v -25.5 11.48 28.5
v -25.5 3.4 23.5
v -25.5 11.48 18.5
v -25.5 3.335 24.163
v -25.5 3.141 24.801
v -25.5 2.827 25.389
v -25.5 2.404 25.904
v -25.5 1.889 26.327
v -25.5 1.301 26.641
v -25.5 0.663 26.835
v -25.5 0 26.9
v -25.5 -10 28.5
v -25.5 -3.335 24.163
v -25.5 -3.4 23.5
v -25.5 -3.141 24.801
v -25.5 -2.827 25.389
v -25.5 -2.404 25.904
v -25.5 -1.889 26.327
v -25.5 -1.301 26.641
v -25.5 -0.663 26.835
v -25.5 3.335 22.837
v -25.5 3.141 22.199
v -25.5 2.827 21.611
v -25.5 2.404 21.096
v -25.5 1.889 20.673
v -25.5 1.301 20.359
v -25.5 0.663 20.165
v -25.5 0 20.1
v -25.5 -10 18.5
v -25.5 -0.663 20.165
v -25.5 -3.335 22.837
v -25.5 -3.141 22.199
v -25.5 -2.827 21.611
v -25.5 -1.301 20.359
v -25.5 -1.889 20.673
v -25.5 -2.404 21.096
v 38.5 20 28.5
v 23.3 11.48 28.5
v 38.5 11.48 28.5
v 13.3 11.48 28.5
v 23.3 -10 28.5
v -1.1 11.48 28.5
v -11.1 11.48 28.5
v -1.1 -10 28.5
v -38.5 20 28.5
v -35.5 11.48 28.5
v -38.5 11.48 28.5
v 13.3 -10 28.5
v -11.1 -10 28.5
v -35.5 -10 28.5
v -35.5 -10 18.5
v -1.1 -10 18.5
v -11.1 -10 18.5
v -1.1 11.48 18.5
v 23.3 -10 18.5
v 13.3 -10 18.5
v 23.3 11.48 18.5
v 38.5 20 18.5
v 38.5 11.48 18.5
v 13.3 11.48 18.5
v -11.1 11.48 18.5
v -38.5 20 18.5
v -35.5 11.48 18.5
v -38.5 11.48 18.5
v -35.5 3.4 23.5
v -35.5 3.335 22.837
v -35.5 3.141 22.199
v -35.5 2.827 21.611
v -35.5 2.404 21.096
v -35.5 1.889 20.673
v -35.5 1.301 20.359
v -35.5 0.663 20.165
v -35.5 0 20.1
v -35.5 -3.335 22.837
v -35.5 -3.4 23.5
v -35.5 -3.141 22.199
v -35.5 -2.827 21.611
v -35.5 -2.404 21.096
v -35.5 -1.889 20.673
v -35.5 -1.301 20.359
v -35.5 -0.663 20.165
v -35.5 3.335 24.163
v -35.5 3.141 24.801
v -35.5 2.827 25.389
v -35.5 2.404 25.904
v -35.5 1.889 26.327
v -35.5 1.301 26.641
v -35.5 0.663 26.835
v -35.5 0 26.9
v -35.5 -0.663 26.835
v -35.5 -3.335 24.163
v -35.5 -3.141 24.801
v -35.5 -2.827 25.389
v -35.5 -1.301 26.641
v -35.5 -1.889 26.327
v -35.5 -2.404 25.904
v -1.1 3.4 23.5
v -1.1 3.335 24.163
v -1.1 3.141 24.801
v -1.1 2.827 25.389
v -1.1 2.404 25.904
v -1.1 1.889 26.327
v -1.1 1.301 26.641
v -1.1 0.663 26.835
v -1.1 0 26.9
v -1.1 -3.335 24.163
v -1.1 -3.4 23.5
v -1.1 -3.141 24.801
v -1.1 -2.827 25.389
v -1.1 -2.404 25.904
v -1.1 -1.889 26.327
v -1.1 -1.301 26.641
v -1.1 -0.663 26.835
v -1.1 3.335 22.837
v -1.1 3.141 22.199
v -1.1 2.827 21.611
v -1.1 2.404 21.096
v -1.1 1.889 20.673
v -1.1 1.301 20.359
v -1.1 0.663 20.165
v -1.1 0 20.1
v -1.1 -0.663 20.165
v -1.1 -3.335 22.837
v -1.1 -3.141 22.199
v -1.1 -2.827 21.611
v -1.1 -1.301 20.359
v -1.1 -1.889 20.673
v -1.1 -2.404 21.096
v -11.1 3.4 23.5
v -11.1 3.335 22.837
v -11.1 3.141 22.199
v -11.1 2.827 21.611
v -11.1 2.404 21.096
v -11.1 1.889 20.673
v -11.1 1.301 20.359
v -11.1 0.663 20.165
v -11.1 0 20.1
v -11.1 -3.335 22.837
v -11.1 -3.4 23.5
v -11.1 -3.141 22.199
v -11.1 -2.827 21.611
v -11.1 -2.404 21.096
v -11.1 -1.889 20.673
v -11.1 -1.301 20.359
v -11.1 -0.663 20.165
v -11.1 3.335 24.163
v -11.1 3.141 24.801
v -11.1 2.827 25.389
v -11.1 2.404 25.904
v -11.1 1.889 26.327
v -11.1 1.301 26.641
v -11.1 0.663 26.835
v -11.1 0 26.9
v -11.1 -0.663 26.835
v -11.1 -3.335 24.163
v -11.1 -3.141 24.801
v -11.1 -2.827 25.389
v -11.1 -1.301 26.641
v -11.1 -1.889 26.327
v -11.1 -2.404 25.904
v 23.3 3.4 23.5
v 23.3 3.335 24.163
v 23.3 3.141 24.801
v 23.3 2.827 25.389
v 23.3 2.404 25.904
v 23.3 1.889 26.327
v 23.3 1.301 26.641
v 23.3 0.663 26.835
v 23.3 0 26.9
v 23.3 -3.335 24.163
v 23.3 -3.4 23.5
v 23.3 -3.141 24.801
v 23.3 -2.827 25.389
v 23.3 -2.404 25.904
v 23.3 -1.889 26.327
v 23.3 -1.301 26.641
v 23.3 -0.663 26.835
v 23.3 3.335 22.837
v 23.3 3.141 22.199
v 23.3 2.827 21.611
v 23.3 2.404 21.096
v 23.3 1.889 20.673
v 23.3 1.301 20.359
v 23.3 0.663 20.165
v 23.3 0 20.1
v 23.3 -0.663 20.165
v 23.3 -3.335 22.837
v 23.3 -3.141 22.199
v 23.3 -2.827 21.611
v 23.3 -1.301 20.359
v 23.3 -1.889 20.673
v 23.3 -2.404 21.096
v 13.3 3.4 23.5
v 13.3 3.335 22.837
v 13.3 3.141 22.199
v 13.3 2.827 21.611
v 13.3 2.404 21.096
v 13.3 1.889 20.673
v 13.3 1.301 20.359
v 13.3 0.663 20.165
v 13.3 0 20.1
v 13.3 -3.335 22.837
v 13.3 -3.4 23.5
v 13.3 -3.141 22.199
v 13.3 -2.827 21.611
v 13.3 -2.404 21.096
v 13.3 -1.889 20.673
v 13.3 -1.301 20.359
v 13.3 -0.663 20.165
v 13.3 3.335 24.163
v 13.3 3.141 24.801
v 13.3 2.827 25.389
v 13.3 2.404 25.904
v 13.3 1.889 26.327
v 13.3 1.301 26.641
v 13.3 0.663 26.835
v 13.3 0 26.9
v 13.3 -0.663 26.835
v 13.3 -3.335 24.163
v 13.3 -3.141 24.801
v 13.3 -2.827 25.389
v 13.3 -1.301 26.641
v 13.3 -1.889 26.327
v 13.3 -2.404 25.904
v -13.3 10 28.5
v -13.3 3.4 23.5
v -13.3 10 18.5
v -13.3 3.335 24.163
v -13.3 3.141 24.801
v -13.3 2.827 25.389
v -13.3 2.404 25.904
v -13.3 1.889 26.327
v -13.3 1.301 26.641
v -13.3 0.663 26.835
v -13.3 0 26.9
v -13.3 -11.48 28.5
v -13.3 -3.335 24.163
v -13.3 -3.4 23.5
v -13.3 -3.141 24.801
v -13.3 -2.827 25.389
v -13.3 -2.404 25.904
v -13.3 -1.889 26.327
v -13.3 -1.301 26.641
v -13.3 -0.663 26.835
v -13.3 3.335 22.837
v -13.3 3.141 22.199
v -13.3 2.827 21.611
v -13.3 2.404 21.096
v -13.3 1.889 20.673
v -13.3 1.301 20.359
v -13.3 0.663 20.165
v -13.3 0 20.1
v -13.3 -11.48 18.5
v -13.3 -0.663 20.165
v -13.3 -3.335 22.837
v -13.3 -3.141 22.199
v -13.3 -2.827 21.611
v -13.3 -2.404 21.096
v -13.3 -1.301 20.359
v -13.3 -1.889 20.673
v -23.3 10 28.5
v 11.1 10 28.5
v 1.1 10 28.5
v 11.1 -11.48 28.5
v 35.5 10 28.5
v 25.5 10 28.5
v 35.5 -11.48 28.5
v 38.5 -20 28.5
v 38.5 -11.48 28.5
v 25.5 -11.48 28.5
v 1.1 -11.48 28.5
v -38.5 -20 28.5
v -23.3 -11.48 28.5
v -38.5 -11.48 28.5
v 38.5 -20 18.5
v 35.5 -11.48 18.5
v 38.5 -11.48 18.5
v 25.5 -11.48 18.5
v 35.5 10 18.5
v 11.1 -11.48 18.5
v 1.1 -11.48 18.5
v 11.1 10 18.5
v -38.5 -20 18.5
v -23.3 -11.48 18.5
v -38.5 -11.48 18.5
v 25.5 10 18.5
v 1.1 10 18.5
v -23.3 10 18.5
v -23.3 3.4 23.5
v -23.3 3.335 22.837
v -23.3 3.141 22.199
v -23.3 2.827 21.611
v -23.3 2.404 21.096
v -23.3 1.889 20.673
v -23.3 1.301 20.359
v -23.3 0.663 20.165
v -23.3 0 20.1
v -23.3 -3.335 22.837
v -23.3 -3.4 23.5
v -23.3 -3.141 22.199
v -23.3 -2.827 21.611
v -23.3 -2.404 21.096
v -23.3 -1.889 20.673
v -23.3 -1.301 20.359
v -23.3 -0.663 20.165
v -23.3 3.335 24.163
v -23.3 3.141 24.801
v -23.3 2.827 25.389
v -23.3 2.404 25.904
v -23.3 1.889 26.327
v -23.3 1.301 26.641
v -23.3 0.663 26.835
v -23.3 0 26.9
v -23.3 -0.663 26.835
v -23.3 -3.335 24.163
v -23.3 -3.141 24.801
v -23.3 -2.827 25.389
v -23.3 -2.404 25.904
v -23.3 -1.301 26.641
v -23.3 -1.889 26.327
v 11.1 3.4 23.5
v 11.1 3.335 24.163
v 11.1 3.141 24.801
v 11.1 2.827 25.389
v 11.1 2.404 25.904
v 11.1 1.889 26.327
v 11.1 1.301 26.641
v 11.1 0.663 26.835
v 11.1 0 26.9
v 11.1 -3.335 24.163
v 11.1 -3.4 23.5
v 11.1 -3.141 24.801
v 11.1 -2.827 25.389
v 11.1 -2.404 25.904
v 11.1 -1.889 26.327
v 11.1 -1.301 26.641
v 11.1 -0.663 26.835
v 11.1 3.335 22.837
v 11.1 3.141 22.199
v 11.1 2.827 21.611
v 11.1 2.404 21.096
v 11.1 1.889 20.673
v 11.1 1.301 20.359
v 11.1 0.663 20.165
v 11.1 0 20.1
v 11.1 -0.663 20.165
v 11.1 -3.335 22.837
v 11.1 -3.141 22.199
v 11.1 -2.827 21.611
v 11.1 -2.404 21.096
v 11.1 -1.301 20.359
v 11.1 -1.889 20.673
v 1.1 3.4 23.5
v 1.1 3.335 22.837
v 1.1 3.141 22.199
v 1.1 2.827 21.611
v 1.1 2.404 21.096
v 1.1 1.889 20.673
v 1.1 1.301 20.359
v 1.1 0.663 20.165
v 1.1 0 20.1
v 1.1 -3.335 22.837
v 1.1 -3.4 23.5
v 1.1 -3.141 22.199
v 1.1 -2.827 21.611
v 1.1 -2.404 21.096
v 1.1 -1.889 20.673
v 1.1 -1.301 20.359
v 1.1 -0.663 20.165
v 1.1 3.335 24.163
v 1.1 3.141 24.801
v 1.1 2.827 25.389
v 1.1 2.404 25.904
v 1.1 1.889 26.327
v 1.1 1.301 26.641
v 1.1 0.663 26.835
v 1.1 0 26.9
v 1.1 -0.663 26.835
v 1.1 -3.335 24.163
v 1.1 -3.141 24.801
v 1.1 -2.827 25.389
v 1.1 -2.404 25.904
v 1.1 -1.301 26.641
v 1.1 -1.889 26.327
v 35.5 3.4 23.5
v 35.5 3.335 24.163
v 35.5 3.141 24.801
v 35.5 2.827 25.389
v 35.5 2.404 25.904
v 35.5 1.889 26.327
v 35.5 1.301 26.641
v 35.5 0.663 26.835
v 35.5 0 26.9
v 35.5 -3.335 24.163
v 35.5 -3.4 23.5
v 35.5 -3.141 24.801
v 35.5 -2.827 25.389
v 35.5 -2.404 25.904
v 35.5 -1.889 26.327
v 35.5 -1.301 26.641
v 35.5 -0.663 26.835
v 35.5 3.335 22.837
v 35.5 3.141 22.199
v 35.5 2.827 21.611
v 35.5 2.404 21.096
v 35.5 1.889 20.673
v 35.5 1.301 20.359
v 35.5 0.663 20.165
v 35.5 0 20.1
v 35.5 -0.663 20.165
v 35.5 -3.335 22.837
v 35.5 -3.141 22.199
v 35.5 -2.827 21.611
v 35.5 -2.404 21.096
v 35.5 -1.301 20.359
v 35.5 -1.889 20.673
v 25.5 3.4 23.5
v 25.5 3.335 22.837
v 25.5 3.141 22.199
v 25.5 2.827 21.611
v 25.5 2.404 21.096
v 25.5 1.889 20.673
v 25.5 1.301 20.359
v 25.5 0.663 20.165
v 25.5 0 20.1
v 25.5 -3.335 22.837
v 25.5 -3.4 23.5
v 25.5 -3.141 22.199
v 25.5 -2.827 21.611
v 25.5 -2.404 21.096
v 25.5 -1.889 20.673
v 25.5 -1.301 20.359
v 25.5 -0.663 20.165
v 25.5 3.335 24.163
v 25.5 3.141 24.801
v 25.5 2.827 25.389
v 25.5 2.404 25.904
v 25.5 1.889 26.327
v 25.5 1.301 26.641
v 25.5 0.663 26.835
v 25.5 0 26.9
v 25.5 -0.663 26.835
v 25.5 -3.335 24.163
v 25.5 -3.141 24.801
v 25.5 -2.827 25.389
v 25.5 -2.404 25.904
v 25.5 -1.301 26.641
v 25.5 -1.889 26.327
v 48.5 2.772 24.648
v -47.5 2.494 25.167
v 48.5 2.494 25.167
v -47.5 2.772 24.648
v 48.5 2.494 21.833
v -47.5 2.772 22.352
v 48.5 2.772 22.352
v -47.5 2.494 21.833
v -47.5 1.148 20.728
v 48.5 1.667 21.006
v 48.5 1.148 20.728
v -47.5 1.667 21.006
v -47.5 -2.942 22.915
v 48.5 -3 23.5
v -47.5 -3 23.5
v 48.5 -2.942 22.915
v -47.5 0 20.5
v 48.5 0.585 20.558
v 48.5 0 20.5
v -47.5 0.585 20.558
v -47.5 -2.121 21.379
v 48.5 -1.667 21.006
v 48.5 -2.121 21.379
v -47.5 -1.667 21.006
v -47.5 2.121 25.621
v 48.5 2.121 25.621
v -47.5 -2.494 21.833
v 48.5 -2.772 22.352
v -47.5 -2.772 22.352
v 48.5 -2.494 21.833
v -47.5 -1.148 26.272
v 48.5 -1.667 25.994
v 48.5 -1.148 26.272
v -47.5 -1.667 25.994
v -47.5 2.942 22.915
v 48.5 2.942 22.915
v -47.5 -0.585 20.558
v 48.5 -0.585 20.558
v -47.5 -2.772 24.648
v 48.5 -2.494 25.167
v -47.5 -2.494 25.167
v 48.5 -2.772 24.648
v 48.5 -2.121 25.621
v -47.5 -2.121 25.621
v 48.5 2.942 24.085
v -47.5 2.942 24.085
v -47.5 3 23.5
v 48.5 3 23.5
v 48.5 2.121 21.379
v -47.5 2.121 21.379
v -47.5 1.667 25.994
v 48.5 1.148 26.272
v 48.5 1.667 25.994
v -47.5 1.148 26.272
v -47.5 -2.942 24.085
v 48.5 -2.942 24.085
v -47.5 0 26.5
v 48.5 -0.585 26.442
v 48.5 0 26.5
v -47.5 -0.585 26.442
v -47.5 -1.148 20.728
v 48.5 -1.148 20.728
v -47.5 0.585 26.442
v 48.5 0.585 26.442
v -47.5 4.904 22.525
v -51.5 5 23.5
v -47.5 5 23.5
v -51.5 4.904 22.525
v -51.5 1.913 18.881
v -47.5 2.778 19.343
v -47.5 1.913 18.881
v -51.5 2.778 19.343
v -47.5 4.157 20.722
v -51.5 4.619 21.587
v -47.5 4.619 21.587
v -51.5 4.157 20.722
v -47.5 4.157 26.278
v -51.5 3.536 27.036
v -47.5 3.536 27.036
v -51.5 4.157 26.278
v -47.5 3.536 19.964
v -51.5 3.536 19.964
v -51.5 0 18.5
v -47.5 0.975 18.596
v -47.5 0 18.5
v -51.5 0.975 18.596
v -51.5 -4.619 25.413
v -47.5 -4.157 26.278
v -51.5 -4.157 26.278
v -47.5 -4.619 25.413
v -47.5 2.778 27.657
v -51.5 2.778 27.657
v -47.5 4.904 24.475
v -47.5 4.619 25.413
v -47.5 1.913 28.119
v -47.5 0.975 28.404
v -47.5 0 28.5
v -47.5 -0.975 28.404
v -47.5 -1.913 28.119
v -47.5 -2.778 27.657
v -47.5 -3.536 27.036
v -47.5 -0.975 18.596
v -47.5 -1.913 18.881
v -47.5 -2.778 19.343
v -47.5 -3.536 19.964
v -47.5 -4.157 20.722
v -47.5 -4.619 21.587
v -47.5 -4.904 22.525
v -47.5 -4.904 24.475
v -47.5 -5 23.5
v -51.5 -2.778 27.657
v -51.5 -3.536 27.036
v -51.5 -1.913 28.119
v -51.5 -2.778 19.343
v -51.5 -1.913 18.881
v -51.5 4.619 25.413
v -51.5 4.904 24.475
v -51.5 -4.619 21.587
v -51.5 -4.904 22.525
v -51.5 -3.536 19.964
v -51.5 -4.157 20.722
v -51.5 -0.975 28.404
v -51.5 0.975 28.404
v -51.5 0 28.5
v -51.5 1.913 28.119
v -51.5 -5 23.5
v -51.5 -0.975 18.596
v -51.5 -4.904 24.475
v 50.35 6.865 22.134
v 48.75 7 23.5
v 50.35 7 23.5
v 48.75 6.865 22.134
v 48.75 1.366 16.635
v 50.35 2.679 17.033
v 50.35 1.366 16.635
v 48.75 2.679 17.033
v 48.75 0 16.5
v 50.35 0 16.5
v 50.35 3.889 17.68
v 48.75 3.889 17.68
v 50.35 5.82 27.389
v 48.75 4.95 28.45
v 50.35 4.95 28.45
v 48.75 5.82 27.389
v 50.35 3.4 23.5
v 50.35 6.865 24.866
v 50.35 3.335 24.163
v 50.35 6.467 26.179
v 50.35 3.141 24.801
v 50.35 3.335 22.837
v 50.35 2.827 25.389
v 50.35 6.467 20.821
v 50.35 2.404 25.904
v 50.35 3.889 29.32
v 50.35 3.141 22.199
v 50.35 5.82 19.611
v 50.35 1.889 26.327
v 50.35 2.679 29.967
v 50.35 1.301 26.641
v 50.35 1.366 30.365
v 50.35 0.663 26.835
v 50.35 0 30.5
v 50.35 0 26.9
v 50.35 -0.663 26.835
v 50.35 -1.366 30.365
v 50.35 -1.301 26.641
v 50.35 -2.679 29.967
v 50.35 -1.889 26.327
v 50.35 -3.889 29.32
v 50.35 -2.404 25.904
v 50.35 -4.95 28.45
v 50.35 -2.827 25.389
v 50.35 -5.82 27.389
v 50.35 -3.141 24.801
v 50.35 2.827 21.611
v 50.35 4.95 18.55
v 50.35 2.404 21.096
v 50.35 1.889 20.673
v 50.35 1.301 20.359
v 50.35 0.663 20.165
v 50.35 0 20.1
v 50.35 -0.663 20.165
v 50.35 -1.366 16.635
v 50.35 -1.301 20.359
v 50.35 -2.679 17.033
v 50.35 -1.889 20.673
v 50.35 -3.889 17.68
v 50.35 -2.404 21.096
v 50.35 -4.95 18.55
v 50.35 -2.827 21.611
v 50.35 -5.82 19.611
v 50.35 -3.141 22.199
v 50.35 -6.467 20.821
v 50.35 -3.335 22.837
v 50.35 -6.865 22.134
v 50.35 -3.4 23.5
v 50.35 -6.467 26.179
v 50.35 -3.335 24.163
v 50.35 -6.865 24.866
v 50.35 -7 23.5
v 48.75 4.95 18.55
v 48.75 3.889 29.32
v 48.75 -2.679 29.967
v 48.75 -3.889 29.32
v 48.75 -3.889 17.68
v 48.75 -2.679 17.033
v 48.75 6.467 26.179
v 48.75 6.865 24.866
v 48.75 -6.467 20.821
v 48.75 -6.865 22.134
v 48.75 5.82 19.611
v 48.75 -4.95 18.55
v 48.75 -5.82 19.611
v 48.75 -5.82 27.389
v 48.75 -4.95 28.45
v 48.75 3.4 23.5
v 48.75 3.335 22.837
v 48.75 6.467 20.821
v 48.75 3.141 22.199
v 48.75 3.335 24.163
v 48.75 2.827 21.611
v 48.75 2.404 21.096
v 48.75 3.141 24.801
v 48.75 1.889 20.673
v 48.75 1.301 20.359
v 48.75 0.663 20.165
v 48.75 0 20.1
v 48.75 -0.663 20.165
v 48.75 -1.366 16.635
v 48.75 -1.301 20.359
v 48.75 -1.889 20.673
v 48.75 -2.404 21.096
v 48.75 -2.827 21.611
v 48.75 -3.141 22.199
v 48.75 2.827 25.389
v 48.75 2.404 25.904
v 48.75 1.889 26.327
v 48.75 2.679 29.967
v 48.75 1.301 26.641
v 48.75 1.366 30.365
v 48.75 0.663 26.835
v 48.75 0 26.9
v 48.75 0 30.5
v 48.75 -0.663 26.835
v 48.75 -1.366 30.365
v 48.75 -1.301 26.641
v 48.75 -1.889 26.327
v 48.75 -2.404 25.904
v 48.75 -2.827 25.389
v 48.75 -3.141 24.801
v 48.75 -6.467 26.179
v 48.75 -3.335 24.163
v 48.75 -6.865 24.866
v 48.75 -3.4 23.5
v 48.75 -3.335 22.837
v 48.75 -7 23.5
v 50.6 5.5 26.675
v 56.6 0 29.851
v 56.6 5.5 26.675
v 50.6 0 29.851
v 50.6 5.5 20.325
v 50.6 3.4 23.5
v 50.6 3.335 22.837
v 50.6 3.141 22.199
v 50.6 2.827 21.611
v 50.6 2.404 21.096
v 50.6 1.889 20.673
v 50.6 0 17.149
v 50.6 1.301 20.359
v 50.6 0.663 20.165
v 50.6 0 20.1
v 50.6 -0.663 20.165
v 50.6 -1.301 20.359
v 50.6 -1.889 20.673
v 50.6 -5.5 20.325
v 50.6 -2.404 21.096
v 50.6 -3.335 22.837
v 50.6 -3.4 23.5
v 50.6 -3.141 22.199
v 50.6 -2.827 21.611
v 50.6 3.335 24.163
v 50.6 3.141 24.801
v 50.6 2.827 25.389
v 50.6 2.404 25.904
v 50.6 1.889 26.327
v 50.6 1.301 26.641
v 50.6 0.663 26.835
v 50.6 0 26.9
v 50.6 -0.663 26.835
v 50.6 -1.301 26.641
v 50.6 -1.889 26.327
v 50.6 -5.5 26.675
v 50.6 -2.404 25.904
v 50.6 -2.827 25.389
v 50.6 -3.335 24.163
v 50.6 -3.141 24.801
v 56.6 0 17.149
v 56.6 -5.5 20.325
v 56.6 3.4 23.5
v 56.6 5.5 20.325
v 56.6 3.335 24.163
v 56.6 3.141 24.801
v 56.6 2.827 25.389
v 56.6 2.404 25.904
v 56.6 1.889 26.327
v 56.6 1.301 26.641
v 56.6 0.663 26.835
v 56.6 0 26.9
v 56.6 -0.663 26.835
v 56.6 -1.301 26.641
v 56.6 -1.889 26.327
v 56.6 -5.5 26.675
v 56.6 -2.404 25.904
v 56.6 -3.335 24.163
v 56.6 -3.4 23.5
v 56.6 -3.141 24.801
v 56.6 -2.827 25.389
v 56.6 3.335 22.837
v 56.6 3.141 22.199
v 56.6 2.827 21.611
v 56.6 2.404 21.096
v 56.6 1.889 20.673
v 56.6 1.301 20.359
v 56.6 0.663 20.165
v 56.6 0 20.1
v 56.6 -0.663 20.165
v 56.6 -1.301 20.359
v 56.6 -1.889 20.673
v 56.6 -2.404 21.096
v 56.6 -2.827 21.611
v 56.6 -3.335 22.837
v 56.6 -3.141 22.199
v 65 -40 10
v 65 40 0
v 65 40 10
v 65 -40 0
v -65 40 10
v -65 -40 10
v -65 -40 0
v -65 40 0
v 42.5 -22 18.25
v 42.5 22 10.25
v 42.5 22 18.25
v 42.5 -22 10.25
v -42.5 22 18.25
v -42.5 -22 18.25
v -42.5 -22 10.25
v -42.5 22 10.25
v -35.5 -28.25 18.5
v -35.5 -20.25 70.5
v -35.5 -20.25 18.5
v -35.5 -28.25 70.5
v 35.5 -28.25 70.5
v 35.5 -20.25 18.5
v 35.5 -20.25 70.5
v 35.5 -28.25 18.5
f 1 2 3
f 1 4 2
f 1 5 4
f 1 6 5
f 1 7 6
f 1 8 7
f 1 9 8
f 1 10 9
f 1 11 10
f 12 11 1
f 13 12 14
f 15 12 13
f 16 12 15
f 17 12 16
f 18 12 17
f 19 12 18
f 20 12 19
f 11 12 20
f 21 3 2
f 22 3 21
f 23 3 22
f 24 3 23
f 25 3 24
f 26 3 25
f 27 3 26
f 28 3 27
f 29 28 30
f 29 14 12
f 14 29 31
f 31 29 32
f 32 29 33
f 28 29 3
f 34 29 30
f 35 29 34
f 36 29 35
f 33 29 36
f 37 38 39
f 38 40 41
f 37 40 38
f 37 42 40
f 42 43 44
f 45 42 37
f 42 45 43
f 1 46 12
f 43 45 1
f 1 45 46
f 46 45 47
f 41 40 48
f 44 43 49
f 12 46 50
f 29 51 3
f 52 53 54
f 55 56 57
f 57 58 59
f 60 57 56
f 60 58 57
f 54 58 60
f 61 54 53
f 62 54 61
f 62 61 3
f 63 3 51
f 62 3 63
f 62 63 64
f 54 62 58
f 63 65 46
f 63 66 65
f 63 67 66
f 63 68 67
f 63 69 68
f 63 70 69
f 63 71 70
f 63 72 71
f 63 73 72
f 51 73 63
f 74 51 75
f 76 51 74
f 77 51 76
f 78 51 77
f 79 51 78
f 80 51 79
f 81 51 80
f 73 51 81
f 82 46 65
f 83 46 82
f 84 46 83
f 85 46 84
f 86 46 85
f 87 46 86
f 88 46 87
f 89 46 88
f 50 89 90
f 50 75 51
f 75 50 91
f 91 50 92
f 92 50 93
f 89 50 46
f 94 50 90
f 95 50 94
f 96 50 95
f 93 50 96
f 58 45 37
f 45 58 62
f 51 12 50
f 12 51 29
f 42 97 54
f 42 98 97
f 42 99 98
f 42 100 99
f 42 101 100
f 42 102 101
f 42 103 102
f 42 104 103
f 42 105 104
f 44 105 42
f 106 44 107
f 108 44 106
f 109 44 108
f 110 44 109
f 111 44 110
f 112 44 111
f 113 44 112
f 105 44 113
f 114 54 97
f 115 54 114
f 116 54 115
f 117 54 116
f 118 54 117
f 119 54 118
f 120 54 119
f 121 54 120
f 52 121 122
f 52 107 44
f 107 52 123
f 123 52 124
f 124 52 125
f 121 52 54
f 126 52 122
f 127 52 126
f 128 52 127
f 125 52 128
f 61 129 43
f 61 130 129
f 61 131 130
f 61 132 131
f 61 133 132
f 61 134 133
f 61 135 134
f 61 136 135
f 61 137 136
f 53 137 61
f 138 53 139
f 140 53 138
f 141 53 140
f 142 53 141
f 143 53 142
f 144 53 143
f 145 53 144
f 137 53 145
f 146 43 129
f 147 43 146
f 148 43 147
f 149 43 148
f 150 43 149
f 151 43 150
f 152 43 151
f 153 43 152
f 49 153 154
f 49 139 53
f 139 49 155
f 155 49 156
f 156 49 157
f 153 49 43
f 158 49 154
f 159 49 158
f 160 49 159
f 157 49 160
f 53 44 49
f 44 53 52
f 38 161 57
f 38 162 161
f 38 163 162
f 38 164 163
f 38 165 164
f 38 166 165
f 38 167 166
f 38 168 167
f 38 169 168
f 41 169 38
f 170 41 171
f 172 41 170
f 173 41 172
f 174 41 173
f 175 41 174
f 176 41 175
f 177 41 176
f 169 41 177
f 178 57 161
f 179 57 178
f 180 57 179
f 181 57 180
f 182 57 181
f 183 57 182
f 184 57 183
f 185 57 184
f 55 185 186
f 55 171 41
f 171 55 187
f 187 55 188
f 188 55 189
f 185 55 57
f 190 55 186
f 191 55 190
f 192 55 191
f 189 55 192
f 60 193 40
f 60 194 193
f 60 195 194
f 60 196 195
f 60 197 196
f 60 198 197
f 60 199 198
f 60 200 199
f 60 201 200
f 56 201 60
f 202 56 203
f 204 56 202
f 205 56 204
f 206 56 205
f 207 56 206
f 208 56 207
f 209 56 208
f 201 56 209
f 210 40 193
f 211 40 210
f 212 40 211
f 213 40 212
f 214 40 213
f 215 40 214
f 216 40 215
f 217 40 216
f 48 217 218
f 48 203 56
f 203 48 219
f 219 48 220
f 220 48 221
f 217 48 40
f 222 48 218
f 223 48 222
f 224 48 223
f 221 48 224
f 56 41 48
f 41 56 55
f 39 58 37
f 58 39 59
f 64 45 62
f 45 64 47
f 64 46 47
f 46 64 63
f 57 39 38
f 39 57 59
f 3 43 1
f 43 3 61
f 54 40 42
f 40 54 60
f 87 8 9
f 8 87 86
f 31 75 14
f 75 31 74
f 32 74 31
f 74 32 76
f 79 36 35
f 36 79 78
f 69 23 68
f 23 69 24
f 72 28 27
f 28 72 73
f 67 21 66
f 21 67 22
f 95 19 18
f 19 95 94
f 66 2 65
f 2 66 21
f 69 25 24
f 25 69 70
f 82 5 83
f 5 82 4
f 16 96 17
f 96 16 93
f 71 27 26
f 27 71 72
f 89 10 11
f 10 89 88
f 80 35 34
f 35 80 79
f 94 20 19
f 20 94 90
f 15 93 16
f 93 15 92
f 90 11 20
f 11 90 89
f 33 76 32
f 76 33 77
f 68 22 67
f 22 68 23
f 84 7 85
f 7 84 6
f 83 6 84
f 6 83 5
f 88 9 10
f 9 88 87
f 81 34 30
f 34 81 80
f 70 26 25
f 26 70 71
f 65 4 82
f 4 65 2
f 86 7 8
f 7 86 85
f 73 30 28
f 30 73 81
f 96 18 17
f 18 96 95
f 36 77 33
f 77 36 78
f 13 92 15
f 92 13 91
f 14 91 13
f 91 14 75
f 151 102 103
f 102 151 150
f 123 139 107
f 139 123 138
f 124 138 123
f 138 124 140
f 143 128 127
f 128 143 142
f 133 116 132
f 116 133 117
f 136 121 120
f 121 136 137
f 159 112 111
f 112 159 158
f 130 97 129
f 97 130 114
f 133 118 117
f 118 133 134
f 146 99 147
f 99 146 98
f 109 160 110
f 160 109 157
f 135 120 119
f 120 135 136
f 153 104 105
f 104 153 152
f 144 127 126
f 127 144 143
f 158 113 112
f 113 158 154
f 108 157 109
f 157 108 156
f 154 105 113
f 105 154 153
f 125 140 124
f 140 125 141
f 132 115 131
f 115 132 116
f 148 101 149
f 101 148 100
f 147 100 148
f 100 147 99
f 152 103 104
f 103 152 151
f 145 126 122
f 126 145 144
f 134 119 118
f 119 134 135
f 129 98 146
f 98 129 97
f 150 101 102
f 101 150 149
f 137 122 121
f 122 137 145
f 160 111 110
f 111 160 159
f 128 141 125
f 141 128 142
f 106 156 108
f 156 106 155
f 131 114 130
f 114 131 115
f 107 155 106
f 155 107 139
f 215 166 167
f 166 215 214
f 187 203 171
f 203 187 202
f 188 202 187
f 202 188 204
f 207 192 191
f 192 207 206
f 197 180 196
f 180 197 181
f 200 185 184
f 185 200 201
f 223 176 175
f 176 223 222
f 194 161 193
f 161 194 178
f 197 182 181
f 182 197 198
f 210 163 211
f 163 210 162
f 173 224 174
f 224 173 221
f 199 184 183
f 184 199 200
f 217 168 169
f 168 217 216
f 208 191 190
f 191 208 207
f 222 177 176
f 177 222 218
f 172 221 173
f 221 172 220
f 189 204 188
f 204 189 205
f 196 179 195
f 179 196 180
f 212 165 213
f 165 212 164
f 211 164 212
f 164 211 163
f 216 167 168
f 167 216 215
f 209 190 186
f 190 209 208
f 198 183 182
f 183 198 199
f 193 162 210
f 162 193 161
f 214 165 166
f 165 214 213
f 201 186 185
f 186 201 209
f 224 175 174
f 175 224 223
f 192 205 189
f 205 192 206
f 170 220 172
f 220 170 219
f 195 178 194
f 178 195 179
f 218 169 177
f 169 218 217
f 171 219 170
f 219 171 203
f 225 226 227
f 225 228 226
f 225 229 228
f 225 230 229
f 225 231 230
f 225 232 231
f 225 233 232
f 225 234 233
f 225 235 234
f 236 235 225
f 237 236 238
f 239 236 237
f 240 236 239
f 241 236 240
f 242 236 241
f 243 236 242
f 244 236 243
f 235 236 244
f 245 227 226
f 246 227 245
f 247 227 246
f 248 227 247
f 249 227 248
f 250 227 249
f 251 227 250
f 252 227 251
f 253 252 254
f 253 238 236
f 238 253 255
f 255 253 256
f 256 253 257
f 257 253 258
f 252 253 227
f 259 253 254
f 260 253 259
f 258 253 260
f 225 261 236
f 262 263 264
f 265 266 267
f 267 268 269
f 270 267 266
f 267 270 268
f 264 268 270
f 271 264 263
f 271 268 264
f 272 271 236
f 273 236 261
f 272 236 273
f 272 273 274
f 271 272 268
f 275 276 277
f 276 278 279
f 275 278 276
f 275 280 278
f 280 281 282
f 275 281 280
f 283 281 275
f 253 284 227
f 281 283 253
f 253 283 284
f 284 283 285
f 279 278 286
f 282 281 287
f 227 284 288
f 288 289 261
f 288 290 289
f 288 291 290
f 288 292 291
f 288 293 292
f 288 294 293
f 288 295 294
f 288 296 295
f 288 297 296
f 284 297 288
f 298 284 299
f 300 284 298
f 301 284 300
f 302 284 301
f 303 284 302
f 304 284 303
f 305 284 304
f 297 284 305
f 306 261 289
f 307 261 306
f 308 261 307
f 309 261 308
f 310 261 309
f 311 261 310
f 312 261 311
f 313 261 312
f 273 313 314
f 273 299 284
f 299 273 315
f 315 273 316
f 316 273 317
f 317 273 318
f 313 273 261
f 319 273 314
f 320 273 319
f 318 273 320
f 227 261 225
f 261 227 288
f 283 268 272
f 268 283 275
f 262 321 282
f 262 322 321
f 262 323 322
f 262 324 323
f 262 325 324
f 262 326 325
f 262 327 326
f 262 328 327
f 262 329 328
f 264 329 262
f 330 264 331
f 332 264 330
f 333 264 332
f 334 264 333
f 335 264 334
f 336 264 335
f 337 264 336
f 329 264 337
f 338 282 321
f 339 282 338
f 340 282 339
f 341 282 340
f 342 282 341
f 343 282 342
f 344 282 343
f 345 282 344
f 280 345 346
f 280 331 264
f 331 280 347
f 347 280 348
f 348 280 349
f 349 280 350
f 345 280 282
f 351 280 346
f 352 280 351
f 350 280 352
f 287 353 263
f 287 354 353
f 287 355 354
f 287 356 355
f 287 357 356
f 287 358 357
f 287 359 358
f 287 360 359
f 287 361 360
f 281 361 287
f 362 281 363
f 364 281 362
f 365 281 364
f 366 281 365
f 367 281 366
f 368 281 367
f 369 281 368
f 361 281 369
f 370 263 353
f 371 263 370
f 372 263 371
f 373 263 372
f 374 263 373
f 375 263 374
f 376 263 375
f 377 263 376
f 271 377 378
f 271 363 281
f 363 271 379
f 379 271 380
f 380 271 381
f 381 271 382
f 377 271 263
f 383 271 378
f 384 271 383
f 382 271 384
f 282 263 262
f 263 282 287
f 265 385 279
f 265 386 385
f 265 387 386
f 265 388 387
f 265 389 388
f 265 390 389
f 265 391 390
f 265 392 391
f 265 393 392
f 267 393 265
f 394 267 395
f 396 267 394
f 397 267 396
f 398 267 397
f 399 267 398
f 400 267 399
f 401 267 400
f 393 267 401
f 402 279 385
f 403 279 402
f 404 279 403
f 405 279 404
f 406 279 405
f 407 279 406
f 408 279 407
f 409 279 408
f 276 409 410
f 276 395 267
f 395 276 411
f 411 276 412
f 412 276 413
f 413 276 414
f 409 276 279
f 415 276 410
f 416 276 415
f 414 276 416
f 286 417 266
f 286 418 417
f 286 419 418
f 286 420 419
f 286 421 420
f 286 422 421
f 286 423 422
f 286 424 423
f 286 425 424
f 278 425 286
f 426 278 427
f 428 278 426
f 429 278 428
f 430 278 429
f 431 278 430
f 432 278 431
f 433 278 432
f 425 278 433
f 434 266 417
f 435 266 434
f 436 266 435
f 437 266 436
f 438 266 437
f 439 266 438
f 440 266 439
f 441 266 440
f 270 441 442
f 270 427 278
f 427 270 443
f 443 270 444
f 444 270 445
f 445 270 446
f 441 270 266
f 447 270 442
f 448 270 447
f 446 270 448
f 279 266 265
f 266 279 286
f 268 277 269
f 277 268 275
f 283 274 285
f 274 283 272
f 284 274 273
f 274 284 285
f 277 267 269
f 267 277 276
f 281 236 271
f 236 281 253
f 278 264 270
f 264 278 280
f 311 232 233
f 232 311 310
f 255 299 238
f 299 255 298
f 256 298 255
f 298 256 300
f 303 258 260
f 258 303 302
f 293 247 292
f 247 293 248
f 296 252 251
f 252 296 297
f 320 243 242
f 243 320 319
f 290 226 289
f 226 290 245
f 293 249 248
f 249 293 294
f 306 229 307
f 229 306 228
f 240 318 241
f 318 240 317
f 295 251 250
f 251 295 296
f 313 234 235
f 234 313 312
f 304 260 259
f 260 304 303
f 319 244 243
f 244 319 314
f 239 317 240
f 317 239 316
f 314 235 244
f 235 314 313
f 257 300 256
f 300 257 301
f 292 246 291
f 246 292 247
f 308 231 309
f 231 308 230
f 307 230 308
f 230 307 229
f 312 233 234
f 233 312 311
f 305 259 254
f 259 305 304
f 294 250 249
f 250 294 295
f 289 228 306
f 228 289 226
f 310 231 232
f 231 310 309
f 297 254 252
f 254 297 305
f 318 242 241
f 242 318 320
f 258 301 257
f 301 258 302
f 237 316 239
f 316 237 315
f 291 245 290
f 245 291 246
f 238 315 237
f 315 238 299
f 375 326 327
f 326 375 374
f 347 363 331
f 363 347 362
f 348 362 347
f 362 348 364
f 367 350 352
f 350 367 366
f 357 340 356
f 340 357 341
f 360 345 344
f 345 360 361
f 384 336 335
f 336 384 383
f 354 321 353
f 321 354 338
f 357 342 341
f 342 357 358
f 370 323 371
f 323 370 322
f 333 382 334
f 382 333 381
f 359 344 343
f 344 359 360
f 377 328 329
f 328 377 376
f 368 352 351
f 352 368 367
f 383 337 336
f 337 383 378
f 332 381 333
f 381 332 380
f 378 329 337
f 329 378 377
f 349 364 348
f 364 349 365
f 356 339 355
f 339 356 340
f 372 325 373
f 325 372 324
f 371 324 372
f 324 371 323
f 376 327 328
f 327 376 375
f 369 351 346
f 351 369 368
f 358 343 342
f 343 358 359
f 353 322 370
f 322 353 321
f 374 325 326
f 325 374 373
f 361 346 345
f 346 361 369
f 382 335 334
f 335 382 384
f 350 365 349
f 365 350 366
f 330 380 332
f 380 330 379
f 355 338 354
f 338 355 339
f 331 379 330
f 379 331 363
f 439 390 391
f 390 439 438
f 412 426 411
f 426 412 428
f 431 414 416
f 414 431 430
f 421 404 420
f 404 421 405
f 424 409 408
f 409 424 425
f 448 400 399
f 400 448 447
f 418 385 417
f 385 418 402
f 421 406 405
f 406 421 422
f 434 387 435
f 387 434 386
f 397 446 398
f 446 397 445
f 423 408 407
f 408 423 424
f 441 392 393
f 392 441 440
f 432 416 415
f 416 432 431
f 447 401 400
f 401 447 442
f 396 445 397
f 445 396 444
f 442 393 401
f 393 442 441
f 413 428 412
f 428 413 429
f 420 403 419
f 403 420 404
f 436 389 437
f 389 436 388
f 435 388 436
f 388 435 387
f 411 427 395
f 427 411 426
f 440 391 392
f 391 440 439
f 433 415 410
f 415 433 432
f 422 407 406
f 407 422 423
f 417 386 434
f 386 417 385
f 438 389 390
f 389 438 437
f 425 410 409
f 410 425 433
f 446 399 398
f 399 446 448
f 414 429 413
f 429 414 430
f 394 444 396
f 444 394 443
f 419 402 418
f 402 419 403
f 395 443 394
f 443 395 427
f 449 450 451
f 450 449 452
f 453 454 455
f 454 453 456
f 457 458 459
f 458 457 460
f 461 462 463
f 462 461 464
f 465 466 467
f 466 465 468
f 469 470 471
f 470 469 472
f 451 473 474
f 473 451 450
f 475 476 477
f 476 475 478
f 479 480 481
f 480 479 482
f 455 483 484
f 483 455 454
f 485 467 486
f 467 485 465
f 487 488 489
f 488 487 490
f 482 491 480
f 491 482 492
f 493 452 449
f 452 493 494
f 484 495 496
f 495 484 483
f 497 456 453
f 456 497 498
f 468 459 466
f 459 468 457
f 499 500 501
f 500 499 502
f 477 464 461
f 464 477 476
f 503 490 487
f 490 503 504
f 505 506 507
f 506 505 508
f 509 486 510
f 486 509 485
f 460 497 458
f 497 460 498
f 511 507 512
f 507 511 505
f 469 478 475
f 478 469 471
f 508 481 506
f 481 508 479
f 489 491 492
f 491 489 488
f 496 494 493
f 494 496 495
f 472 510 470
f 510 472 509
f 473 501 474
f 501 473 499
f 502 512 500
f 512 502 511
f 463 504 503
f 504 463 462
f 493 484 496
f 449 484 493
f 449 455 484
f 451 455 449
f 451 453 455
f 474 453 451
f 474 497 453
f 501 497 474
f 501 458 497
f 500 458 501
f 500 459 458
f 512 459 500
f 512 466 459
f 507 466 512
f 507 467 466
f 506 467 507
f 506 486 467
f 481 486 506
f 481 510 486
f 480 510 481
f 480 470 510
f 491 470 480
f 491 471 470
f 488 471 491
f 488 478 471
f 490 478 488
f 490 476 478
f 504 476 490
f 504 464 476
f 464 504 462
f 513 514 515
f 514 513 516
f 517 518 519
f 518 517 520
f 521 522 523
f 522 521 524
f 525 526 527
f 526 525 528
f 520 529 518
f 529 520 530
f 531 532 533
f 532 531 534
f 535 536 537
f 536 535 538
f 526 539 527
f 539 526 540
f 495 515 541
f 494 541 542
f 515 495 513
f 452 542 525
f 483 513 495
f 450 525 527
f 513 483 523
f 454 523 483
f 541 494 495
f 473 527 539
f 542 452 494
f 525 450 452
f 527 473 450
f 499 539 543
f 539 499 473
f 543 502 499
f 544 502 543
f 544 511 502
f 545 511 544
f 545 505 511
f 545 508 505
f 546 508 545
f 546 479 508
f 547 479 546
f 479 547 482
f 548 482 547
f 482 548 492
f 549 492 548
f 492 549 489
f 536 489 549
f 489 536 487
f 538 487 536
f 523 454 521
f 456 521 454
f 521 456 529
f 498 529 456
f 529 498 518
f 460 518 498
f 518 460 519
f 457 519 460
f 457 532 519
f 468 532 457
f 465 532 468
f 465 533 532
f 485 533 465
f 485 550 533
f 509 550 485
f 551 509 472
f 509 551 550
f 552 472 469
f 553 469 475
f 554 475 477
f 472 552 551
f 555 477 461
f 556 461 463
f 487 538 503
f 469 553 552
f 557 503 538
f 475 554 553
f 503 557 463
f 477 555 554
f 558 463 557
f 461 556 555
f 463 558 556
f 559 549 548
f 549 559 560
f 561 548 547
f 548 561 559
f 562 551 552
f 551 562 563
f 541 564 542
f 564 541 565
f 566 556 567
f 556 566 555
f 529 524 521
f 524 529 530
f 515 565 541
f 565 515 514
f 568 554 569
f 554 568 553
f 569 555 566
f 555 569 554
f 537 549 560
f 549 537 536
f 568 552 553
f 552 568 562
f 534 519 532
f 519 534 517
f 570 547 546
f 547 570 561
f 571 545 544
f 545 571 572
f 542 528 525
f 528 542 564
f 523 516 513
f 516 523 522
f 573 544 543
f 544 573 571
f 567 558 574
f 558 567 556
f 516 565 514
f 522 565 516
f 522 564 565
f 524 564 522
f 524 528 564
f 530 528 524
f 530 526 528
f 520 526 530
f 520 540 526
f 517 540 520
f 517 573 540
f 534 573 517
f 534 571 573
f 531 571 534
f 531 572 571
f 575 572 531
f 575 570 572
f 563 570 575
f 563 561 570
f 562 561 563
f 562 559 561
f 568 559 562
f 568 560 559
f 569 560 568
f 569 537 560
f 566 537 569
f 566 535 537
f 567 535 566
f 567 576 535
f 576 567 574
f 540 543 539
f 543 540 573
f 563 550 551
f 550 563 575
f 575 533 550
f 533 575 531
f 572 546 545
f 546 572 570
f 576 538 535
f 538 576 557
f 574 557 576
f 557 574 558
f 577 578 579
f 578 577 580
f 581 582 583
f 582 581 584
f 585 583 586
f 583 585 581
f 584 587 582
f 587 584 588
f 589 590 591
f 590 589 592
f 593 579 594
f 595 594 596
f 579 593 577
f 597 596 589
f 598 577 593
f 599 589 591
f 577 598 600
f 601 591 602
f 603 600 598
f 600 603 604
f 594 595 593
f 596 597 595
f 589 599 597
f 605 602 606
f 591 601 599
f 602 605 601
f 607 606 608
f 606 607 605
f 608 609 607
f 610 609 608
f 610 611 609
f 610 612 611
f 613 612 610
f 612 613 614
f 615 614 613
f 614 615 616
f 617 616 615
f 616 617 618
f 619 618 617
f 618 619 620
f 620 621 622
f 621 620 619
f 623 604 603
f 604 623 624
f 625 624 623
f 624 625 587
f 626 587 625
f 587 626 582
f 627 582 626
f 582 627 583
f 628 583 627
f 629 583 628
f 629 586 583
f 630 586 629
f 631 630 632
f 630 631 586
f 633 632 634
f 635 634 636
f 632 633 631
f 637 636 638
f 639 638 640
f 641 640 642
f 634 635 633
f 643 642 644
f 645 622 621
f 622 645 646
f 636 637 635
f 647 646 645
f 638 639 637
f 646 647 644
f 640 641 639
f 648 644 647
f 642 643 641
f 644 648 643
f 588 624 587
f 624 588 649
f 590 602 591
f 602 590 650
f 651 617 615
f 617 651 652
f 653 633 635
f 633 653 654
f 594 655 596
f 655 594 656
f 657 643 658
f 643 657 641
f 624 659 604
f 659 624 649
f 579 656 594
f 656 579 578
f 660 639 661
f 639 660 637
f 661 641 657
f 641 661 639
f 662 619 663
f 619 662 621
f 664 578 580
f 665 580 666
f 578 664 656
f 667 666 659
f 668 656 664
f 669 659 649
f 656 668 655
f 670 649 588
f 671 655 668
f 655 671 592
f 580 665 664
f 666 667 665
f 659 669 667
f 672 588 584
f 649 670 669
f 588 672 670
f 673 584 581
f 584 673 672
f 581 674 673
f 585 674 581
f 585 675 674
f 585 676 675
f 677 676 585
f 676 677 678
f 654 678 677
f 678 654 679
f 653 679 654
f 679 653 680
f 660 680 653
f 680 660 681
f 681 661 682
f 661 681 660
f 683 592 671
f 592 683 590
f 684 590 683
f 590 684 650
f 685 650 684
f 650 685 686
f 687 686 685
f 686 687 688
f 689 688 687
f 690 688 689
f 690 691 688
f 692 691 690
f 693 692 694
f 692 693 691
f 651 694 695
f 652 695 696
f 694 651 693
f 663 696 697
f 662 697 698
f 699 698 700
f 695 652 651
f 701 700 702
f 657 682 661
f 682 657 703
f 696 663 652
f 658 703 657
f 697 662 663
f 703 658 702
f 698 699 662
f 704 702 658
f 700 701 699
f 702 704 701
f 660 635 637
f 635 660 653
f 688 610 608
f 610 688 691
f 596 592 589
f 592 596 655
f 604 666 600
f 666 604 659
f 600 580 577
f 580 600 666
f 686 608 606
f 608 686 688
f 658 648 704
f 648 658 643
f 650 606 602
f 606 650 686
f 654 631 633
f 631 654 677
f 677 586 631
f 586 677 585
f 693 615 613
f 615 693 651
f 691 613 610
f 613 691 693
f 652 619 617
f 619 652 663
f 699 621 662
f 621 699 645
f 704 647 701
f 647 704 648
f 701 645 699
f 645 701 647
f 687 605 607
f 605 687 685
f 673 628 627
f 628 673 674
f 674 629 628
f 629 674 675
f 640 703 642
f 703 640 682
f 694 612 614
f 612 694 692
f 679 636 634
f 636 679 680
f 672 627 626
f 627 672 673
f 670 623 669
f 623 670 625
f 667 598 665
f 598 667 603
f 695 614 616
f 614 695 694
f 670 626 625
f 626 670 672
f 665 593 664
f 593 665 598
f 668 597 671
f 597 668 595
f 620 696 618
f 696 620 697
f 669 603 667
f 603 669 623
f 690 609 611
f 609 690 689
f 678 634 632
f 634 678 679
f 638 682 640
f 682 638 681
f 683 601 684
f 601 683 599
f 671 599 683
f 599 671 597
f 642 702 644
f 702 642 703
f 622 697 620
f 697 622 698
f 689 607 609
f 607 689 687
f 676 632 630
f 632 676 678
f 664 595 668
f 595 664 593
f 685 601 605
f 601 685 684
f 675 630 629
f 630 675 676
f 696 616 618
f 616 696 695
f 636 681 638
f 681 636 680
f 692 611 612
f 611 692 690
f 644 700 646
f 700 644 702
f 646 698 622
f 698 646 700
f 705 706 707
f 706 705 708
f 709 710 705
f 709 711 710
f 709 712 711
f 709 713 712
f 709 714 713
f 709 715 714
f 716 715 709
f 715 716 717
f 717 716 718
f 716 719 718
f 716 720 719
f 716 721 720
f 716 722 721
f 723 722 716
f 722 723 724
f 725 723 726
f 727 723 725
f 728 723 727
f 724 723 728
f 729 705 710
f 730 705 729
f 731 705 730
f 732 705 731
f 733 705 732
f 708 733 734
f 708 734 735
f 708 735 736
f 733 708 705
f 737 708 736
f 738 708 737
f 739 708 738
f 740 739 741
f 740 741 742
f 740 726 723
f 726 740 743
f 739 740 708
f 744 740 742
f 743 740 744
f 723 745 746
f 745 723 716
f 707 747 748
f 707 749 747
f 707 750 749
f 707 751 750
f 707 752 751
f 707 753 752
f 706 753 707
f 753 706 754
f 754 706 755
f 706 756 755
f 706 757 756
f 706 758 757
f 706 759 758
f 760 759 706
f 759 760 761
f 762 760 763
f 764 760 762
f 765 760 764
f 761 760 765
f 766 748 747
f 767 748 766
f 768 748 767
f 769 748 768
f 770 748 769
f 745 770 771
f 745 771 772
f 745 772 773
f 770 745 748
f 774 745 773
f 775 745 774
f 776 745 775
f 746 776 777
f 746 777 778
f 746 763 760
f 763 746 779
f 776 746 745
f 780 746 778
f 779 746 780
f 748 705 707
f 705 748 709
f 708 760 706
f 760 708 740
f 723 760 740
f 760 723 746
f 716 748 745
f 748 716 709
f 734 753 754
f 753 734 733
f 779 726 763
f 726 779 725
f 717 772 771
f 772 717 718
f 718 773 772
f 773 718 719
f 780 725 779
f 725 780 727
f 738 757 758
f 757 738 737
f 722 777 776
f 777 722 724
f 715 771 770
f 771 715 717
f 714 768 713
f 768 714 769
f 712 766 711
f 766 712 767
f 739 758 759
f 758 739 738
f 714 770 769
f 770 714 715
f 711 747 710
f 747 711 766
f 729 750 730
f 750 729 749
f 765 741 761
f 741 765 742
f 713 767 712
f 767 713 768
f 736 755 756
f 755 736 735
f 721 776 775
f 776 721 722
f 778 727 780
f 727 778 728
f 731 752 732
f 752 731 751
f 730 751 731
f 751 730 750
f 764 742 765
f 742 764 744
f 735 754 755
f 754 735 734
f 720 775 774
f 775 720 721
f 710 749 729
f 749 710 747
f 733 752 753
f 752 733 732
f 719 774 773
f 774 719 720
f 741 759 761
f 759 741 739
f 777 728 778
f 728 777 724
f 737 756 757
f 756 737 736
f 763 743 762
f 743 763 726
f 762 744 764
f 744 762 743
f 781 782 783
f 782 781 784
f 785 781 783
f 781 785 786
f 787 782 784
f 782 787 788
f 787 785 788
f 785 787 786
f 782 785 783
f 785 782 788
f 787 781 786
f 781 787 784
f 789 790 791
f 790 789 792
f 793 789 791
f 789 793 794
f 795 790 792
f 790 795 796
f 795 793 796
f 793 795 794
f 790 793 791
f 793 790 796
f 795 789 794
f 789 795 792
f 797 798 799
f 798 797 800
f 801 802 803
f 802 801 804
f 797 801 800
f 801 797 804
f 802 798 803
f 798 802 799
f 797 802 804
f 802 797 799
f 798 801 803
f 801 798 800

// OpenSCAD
$fn = 32;

// ------------------------------------------------------------------------
// Comb hinge with flap: leaf 77 x 20 mm, pin d6, flap 52 mm
// Every part is its own module, assembly() places every instance.
// ------------------------------------------------------------------------

// --- part 1 ---
module hinge_bed() {
  difference() {
    translate([-65, -40, 0]) cube([130, 80, 10]);
  }
}

// --- part 2 ---
module hinge_riser() {
  difference() {
    translate([-42.5, -22, 0]) cube([85, 44, 8]);
  }
}

// --- part 3 ---
module hinge_leaf_a() {
  difference() {
    union() {
      translate([-35.5, -10, -5]) cube([10, 30, 10]);
      translate([-11.1, -10, -5]) cube([10, 30, 10]);
      translate([13.3, -10, -5]) cube([10, 30, 10]);
      translate([-38.5, 11.48, -5]) cube([77, 8.52, 10]);
    }
    translate([-30.5, 0, 0]) rotate([0, 90, 0]) cylinder(h = 12, d = 6.8, center = true);
    translate([-6.1, 0, 0]) rotate([0, 90, 0]) cylinder(h = 12, d = 6.8, center = true);
    translate([18.3, 0, 0]) rotate([0, 90, 0]) cylinder(h = 12, d = 6.8, center = true);
  }
}

// --- part 4 ---
module hinge_leaf_b() {
  difference() {
    union() {
      translate([-23.3, -20, -5]) cube([10, 30, 10]);
      translate([1.1, -20, -5]) cube([10, 30, 10]);
      translate([25.5, -20, -5]) cube([10, 30, 10]);
      translate([-38.5, -20, -5]) cube([77, 8.52, 10]);
    }
    translate([-18.3, 0, 0]) rotate([0, 90, 0]) cylinder(h = 12, d = 6.8, center = true);
    translate([6.1, 0, 0]) rotate([0, 90, 0]) cylinder(h = 12, d = 6.8, center = true);
    translate([30.5, 0, 0]) rotate([0, 90, 0]) cylinder(h = 12, d = 6.8, center = true);
  }
}

// --- part 5 ---
module hinge_flap() {
  difference() {
    translate([-35.5, -26, 0]) cube([71, 52, 8]);
  }
}

// --- part 6 ---
module hinge_pin() {
  rotate([0, 90, 0]) cylinder(h = 97, d = 6, center = true);
  translate([-51.5, 0, 0]) rotate([0, 90, 0]) cylinder(h = 4, d = 10);
}

// --- part 7 ---
module pin_washer() {
  difference() {
      translate([0, 0, 0]) cylinder(h = 1.6, d = 14);
      translate([0, 0, -1]) cylinder(h = 3.6, d = 6.8);
    }
}

// --- part 8 ---
module pin_nut() {
  difference() {
    linear_extrude(height = 6) polygon(points = [[6.351, 0], [3.175, 5.5], [-3.175, 5.5], [-6.351, 0], [-3.175, -5.5], [3.175, -5.5]]);
    translate([0, 0, -1]) cylinder(h = 8, d = 6.8);
  }
}

// --- assembly ---
module assembly() {
  color([0.80, 0.24, 0.20]) translate([0, 0, 0]) rotate([0, 0, 0]) hinge_bed();
  color([0.20, 0.45, 0.75]) translate([0, 0, 10.25]) rotate([0, 0, 0]) hinge_riser();
  color([0.25, 0.62, 0.32]) translate([0, 0, 23.5]) rotate([0, 0, 0]) hinge_leaf_a();
  color([0.92, 0.70, 0.18]) translate([0, 0, 23.5]) rotate([0, 0, 0]) hinge_leaf_b();
  color([0.58, 0.35, 0.70]) translate([0, -20.25, 44.5]) rotate([90, 0, 0]) hinge_flap();
  color([0.16, 0.66, 0.66]) translate([0, 0, 23.5]) rotate([0, 0, 0]) hinge_pin();
  color([0.85, 0.48, 0.18]) translate([48.75, 0, 23.5]) rotate([0, 90, 0]) pin_washer();
  color([0.55, 0.60, 0.65]) translate([50.6, 0, 23.5]) rotate([0, 90, 0]) pin_nut();
}

assembly();
